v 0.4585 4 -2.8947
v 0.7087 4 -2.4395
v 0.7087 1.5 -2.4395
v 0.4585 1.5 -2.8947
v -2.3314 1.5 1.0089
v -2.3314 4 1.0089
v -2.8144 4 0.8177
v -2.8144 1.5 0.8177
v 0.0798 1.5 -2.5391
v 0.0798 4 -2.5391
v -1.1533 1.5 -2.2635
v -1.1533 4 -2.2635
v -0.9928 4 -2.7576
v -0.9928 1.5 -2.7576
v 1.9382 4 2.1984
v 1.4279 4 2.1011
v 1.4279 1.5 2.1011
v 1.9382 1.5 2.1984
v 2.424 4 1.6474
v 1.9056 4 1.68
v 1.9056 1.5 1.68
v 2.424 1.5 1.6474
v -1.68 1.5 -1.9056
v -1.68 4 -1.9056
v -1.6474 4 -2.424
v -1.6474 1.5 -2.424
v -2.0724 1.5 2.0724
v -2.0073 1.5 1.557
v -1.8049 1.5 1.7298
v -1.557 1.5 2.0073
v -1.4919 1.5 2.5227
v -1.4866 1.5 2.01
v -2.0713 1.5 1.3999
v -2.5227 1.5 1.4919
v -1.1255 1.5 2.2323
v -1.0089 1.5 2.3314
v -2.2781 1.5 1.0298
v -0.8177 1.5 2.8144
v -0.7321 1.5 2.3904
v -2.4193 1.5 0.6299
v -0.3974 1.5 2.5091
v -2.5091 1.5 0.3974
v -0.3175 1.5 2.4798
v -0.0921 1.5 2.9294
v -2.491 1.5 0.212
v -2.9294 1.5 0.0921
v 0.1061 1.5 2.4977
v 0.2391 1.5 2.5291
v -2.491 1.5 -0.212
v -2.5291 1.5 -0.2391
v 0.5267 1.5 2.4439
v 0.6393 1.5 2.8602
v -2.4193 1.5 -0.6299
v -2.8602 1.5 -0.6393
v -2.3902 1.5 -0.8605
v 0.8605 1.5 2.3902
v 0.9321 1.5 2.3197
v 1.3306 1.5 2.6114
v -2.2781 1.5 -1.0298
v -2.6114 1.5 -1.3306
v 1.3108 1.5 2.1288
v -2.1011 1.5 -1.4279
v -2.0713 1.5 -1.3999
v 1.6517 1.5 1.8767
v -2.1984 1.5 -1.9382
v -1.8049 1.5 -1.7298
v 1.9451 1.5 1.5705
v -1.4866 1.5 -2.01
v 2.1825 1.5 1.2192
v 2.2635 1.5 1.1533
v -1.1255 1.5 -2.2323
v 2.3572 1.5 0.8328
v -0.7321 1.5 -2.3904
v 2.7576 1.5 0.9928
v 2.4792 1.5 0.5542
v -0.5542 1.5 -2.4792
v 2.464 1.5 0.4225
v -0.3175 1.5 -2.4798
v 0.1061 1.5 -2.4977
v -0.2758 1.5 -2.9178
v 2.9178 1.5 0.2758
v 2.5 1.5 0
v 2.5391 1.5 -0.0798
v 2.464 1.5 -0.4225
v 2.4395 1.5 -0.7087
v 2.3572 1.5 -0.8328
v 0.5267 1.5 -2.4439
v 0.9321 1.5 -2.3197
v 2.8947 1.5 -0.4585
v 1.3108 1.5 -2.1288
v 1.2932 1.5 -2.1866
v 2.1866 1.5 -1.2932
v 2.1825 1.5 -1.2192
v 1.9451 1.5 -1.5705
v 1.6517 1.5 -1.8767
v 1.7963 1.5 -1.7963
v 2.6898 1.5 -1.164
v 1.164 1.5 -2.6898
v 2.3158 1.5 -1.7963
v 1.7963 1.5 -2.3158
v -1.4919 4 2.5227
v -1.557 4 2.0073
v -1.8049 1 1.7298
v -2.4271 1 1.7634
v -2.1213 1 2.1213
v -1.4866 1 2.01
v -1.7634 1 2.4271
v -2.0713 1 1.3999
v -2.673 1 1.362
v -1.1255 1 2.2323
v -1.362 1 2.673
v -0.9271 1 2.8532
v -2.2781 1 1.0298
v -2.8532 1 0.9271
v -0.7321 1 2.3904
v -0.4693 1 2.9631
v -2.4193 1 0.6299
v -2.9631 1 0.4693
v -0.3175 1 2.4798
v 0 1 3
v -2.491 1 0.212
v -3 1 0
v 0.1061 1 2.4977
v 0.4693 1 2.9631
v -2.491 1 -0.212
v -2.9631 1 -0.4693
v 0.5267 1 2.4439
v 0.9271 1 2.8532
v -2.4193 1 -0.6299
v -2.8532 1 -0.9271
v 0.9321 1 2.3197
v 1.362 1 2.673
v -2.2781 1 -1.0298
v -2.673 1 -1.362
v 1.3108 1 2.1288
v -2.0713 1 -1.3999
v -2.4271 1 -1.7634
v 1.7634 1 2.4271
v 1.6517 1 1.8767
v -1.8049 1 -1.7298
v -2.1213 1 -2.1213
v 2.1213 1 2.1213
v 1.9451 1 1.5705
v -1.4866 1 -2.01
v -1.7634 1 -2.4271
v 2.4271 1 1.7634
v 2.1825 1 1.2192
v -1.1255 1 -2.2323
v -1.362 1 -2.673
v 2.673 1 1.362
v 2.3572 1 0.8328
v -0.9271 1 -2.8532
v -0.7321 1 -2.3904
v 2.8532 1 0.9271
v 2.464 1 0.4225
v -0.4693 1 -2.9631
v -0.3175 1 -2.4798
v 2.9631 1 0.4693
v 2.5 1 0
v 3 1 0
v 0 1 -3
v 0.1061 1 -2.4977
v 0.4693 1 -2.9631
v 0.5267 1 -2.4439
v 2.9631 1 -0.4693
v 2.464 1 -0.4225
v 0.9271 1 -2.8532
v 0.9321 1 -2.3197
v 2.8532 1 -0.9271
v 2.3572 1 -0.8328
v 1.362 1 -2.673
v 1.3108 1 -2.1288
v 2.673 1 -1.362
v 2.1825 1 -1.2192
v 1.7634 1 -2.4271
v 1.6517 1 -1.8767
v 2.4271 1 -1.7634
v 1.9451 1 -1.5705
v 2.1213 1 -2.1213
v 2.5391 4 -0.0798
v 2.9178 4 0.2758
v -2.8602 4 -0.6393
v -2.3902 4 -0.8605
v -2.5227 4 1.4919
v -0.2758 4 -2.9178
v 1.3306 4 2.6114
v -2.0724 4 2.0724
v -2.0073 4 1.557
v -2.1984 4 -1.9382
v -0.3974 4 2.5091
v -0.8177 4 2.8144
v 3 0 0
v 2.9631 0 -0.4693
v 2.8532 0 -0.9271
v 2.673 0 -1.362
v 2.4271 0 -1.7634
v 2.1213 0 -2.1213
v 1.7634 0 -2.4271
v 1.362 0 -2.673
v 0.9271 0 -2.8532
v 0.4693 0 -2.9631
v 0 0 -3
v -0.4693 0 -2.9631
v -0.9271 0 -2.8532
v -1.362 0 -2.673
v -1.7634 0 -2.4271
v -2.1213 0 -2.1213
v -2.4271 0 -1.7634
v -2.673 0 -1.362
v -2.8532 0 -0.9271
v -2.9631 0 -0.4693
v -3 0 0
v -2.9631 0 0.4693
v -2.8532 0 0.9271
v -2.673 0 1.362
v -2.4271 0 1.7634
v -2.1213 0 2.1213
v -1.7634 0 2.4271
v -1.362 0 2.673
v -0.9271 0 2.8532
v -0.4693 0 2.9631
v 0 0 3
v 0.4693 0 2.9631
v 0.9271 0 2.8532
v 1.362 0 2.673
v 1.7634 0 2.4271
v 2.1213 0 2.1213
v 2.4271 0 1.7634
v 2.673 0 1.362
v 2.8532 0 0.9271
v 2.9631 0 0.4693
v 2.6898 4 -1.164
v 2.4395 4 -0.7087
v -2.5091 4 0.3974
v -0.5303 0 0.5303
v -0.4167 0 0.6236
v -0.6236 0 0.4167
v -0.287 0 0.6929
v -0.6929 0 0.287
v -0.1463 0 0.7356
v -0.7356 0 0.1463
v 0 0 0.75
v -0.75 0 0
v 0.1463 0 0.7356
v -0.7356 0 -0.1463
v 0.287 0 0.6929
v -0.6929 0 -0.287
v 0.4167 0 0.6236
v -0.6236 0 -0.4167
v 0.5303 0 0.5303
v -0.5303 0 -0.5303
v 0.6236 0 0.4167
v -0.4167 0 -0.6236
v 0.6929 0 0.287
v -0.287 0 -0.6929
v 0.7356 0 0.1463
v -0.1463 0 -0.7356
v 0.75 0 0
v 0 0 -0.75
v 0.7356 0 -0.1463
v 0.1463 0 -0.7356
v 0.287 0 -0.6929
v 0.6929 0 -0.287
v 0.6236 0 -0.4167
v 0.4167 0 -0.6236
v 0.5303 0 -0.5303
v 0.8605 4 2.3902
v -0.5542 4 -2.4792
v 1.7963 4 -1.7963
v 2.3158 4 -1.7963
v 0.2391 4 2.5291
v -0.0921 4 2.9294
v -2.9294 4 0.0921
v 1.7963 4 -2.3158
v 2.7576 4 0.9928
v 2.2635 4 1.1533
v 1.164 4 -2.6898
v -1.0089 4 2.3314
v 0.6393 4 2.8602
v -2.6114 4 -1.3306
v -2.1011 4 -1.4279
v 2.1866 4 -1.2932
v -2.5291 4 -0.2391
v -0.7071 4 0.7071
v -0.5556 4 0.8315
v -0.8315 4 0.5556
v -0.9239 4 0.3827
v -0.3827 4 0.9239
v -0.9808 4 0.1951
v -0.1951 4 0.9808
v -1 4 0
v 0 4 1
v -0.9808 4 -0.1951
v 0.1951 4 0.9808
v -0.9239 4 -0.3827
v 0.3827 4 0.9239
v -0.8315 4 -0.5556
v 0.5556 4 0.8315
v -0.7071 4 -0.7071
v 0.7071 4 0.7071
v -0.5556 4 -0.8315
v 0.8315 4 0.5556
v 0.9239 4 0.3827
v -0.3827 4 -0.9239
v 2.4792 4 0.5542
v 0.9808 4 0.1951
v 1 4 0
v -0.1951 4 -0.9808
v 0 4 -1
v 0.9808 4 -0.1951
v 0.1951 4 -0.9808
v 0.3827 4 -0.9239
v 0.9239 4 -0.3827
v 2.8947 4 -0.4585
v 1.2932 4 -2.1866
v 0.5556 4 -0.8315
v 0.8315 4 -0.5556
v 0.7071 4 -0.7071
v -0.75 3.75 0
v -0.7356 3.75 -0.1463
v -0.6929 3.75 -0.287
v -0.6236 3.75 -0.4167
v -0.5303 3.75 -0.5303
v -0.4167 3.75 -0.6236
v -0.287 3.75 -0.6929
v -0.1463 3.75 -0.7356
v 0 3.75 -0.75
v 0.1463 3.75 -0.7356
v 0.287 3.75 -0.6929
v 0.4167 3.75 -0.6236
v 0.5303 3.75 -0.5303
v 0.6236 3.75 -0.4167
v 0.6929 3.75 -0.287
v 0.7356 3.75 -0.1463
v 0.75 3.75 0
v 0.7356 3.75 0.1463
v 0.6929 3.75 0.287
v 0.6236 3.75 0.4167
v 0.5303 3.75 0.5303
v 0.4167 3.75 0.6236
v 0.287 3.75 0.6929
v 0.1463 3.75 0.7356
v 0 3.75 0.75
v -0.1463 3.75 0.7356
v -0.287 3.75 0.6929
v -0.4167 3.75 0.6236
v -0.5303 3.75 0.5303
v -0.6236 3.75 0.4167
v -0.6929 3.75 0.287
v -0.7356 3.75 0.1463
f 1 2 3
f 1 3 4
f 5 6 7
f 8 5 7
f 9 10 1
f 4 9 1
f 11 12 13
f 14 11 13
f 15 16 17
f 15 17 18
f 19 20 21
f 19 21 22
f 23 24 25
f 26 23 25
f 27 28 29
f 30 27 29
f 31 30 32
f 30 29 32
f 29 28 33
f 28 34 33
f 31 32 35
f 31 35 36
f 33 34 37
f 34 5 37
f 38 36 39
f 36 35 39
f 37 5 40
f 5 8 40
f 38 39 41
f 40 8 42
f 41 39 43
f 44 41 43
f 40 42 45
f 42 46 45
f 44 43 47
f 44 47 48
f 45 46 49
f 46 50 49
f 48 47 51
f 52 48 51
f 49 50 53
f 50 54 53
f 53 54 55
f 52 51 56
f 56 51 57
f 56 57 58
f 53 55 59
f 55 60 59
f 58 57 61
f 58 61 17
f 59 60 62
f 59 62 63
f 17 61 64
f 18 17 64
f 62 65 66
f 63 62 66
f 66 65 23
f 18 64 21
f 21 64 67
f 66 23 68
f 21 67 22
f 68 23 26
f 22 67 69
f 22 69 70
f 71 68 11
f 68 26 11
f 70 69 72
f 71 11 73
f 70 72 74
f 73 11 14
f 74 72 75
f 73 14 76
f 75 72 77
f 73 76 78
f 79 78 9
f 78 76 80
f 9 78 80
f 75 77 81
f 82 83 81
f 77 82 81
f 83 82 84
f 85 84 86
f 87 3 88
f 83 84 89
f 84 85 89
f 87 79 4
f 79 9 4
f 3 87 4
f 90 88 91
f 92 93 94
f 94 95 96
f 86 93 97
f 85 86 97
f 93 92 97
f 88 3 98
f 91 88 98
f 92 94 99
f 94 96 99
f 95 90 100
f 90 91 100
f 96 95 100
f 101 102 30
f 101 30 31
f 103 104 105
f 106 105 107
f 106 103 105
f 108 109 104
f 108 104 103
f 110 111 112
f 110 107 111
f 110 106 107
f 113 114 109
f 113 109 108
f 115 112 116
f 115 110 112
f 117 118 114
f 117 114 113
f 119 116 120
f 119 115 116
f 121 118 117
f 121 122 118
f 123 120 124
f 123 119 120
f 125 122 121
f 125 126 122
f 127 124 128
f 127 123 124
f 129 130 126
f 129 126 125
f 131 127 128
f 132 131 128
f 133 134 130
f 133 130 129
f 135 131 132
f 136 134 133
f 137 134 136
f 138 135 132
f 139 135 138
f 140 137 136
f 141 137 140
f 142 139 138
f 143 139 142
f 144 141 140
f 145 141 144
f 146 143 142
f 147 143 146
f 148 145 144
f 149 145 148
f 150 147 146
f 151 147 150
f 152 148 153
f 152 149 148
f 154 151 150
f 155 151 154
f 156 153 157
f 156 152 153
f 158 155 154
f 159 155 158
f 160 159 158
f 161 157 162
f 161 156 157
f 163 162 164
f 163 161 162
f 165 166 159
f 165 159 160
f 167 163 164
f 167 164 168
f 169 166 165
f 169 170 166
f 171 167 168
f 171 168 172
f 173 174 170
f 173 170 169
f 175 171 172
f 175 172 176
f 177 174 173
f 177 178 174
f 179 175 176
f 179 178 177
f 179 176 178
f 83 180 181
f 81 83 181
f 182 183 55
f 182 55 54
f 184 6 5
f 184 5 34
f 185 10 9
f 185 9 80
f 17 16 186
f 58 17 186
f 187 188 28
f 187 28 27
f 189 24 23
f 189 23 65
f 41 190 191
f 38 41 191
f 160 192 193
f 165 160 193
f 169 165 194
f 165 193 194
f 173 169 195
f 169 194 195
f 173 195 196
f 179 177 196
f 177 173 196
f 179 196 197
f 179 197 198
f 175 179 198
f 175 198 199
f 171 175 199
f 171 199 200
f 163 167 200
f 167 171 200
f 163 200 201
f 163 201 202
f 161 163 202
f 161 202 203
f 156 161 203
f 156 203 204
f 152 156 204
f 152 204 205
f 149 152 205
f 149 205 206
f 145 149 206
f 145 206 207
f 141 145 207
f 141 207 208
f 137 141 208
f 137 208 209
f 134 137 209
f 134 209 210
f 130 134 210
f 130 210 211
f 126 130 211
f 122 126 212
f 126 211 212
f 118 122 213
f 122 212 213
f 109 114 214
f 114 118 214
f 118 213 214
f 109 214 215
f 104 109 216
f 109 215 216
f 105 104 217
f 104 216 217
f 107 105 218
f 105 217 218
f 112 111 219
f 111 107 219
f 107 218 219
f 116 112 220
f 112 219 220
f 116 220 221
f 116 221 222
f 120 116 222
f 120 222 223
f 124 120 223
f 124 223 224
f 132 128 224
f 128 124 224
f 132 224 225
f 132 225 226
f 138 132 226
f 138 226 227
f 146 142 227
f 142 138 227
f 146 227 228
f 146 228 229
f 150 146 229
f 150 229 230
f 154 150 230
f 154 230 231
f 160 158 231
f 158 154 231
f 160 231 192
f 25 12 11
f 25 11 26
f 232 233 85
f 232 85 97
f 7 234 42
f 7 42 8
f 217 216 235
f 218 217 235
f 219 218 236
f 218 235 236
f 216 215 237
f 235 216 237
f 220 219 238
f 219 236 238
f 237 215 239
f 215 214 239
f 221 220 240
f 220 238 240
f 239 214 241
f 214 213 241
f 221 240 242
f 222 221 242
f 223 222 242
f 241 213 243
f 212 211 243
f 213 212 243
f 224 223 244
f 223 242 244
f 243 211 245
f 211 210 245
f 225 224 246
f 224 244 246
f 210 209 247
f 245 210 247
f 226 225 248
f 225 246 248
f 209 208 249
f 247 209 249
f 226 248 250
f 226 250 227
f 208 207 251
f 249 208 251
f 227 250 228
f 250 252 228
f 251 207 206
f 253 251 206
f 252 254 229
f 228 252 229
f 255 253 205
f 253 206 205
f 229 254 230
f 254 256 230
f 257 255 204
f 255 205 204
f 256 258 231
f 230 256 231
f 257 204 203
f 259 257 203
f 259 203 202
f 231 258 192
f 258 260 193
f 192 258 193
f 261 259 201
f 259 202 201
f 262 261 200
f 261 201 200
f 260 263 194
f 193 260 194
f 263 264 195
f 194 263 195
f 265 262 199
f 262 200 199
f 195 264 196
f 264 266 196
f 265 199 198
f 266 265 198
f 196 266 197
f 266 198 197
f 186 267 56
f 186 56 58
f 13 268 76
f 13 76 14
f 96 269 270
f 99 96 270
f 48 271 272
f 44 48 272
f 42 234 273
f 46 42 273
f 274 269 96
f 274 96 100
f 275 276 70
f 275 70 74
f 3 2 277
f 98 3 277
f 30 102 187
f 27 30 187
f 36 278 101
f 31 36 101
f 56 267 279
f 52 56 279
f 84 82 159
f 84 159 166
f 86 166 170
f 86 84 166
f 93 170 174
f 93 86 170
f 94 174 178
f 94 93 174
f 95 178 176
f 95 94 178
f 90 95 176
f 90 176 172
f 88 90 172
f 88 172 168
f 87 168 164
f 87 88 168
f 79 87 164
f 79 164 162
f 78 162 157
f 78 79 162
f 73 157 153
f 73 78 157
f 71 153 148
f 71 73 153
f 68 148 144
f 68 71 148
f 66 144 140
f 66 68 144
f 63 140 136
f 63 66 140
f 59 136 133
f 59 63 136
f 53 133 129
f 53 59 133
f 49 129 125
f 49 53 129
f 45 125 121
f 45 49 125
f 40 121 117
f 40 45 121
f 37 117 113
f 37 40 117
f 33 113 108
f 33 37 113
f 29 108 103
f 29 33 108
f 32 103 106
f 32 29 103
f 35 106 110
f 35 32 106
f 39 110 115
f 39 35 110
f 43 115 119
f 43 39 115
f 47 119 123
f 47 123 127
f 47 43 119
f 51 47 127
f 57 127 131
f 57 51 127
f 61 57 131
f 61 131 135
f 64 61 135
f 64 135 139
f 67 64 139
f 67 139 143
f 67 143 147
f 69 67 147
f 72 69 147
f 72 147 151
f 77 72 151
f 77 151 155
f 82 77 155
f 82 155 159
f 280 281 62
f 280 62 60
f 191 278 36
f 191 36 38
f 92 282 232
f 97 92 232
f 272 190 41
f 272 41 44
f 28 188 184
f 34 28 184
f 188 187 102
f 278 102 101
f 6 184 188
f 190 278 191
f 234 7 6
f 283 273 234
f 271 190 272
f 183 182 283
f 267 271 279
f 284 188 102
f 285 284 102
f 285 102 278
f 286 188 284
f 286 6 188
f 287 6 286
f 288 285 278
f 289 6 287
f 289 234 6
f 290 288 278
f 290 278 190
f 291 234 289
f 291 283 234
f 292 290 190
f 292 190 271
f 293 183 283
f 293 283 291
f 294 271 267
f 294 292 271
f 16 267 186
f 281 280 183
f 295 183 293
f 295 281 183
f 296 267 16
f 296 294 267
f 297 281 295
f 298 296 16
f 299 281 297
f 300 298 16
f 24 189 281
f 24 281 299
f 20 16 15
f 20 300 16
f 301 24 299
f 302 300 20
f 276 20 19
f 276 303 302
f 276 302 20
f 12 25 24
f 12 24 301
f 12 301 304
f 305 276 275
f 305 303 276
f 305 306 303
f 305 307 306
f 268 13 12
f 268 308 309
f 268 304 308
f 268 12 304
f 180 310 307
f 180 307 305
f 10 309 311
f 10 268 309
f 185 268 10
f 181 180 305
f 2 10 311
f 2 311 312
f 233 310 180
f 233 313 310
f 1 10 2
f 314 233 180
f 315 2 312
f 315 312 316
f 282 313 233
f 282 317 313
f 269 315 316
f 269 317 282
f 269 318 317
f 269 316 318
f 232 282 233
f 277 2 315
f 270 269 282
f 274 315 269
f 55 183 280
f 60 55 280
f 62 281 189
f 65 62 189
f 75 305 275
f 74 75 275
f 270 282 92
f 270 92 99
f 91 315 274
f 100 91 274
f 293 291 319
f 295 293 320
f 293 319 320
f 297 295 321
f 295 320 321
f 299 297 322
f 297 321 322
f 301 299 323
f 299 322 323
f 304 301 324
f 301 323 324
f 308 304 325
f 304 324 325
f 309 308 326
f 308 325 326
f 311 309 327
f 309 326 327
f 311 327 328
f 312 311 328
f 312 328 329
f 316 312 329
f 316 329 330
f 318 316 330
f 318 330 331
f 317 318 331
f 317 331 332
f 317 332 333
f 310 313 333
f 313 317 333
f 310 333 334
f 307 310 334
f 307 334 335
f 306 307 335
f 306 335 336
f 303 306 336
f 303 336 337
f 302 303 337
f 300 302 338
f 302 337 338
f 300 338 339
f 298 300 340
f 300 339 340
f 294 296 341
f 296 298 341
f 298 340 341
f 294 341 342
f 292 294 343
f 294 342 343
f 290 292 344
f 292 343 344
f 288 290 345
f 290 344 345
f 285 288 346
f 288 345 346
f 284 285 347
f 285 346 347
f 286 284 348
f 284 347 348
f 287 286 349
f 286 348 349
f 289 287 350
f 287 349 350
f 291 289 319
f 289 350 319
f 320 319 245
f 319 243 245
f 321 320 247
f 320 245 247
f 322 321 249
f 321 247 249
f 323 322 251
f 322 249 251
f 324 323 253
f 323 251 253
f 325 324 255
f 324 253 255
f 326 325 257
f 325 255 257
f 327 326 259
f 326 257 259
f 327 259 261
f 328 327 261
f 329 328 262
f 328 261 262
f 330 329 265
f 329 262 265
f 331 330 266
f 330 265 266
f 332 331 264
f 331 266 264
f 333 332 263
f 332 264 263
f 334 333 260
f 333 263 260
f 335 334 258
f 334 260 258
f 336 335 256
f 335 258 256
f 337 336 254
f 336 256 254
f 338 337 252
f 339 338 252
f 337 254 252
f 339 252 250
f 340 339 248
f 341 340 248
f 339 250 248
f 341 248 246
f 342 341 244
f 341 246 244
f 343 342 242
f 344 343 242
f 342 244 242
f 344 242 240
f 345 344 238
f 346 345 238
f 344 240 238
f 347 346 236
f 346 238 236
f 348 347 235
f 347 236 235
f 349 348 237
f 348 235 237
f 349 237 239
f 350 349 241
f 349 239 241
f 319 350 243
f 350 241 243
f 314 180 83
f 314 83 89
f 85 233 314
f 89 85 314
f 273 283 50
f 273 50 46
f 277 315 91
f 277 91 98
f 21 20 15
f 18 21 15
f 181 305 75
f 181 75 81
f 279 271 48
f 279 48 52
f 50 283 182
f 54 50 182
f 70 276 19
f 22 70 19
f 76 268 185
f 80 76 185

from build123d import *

# Parameters (mm, degrees)
SKETCH1_R                     = 3
BOSS_EXTRUDE1_DEPTH           = 4
SKETCH2_W                     = 0.65
SKETCH2_H                     = 0.65
CUT_EXTRUDE1_DEPTH            = 2.5
CIRPATTERN1_COUNT             = 25
SKETCH3_OUTSIDE_W             = 9.876
SKETCH3_OUTSIDE_H             = 9.876
SKETCH3_OUTSIDE_R             = 2.5
CUT_EXTRUDE2_DEPTH            = 0.5
CSK_FOR_M3_SFHCS1_D           = 1.5
CSK_FOR_M3_SFHCS1_CSINK_D     = 2
CSK_FOR_M3_SFHCS1_CSINK_ANGLE = 90


with BuildPart() as part:
    # Sketch1 → Boss-Extrude1 (new body)
    with BuildSketch(Plane(origin=(0, 0, 0), x_dir=(1, 0, 0), z_dir=(0, 1, 0))):
        Circle(SKETCH1_R)
    extrude(amount=BOSS_EXTRUDE1_DEPTH)

    # Sketch2 → Cut-Extrude1 (cut)
    with BuildSketch(Plane(origin=(0, 4, 0), x_dir=(1, 0, 0), z_dir=(0, 1, 0))):
        with Locations((2.121320344, 2.121320344)):
            Rectangle(SKETCH2_W, SKETCH2_H)
    cut_extrude1 = extrude(amount=-CUT_EXTRUDE1_DEPTH, mode=Mode.SUBTRACT)

    # CirPattern1: Cut-Extrude1 ×25 about axis
    cirpattern1_axis = Axis((0, 4, 0), (0, -1, 0))
    for i in range(1, CIRPATTERN1_COUNT):
        add(cut_extrude1.rotate(cirpattern1_axis, i * 360 / CIRPATTERN1_COUNT), mode=Mode.SUBTRACT)

    # Sketch3 outside → Cut-Extrude2 (cut)
    with BuildSketch(Plane(origin=(0, 1.5, 0), x_dir=(1, 0, 0), z_dir=(0, 1, 0))):
        Rectangle(SKETCH3_OUTSIDE_W, SKETCH3_OUTSIDE_H)
        Circle(SKETCH3_OUTSIDE_R, mode=Mode.SUBTRACT)
    extrude(amount=-CUT_EXTRUDE2_DEPTH, mode=Mode.SUBTRACT)

    # CSK for M3 SFHCS1 (through all)
    with Locations(Plane(origin=(0, 4, 0), x_dir=(1, 0, 0), z_dir=(0, 1, 0))):
        with Locations((0, 0)):
            CounterSinkHole(CSK_FOR_M3_SFHCS1_D / 2, CSK_FOR_M3_SFHCS1_CSINK_D / 2, counter_sink_angle=CSK_FOR_M3_SFHCS1_CSINK_ANGLE)


solid = part.part
